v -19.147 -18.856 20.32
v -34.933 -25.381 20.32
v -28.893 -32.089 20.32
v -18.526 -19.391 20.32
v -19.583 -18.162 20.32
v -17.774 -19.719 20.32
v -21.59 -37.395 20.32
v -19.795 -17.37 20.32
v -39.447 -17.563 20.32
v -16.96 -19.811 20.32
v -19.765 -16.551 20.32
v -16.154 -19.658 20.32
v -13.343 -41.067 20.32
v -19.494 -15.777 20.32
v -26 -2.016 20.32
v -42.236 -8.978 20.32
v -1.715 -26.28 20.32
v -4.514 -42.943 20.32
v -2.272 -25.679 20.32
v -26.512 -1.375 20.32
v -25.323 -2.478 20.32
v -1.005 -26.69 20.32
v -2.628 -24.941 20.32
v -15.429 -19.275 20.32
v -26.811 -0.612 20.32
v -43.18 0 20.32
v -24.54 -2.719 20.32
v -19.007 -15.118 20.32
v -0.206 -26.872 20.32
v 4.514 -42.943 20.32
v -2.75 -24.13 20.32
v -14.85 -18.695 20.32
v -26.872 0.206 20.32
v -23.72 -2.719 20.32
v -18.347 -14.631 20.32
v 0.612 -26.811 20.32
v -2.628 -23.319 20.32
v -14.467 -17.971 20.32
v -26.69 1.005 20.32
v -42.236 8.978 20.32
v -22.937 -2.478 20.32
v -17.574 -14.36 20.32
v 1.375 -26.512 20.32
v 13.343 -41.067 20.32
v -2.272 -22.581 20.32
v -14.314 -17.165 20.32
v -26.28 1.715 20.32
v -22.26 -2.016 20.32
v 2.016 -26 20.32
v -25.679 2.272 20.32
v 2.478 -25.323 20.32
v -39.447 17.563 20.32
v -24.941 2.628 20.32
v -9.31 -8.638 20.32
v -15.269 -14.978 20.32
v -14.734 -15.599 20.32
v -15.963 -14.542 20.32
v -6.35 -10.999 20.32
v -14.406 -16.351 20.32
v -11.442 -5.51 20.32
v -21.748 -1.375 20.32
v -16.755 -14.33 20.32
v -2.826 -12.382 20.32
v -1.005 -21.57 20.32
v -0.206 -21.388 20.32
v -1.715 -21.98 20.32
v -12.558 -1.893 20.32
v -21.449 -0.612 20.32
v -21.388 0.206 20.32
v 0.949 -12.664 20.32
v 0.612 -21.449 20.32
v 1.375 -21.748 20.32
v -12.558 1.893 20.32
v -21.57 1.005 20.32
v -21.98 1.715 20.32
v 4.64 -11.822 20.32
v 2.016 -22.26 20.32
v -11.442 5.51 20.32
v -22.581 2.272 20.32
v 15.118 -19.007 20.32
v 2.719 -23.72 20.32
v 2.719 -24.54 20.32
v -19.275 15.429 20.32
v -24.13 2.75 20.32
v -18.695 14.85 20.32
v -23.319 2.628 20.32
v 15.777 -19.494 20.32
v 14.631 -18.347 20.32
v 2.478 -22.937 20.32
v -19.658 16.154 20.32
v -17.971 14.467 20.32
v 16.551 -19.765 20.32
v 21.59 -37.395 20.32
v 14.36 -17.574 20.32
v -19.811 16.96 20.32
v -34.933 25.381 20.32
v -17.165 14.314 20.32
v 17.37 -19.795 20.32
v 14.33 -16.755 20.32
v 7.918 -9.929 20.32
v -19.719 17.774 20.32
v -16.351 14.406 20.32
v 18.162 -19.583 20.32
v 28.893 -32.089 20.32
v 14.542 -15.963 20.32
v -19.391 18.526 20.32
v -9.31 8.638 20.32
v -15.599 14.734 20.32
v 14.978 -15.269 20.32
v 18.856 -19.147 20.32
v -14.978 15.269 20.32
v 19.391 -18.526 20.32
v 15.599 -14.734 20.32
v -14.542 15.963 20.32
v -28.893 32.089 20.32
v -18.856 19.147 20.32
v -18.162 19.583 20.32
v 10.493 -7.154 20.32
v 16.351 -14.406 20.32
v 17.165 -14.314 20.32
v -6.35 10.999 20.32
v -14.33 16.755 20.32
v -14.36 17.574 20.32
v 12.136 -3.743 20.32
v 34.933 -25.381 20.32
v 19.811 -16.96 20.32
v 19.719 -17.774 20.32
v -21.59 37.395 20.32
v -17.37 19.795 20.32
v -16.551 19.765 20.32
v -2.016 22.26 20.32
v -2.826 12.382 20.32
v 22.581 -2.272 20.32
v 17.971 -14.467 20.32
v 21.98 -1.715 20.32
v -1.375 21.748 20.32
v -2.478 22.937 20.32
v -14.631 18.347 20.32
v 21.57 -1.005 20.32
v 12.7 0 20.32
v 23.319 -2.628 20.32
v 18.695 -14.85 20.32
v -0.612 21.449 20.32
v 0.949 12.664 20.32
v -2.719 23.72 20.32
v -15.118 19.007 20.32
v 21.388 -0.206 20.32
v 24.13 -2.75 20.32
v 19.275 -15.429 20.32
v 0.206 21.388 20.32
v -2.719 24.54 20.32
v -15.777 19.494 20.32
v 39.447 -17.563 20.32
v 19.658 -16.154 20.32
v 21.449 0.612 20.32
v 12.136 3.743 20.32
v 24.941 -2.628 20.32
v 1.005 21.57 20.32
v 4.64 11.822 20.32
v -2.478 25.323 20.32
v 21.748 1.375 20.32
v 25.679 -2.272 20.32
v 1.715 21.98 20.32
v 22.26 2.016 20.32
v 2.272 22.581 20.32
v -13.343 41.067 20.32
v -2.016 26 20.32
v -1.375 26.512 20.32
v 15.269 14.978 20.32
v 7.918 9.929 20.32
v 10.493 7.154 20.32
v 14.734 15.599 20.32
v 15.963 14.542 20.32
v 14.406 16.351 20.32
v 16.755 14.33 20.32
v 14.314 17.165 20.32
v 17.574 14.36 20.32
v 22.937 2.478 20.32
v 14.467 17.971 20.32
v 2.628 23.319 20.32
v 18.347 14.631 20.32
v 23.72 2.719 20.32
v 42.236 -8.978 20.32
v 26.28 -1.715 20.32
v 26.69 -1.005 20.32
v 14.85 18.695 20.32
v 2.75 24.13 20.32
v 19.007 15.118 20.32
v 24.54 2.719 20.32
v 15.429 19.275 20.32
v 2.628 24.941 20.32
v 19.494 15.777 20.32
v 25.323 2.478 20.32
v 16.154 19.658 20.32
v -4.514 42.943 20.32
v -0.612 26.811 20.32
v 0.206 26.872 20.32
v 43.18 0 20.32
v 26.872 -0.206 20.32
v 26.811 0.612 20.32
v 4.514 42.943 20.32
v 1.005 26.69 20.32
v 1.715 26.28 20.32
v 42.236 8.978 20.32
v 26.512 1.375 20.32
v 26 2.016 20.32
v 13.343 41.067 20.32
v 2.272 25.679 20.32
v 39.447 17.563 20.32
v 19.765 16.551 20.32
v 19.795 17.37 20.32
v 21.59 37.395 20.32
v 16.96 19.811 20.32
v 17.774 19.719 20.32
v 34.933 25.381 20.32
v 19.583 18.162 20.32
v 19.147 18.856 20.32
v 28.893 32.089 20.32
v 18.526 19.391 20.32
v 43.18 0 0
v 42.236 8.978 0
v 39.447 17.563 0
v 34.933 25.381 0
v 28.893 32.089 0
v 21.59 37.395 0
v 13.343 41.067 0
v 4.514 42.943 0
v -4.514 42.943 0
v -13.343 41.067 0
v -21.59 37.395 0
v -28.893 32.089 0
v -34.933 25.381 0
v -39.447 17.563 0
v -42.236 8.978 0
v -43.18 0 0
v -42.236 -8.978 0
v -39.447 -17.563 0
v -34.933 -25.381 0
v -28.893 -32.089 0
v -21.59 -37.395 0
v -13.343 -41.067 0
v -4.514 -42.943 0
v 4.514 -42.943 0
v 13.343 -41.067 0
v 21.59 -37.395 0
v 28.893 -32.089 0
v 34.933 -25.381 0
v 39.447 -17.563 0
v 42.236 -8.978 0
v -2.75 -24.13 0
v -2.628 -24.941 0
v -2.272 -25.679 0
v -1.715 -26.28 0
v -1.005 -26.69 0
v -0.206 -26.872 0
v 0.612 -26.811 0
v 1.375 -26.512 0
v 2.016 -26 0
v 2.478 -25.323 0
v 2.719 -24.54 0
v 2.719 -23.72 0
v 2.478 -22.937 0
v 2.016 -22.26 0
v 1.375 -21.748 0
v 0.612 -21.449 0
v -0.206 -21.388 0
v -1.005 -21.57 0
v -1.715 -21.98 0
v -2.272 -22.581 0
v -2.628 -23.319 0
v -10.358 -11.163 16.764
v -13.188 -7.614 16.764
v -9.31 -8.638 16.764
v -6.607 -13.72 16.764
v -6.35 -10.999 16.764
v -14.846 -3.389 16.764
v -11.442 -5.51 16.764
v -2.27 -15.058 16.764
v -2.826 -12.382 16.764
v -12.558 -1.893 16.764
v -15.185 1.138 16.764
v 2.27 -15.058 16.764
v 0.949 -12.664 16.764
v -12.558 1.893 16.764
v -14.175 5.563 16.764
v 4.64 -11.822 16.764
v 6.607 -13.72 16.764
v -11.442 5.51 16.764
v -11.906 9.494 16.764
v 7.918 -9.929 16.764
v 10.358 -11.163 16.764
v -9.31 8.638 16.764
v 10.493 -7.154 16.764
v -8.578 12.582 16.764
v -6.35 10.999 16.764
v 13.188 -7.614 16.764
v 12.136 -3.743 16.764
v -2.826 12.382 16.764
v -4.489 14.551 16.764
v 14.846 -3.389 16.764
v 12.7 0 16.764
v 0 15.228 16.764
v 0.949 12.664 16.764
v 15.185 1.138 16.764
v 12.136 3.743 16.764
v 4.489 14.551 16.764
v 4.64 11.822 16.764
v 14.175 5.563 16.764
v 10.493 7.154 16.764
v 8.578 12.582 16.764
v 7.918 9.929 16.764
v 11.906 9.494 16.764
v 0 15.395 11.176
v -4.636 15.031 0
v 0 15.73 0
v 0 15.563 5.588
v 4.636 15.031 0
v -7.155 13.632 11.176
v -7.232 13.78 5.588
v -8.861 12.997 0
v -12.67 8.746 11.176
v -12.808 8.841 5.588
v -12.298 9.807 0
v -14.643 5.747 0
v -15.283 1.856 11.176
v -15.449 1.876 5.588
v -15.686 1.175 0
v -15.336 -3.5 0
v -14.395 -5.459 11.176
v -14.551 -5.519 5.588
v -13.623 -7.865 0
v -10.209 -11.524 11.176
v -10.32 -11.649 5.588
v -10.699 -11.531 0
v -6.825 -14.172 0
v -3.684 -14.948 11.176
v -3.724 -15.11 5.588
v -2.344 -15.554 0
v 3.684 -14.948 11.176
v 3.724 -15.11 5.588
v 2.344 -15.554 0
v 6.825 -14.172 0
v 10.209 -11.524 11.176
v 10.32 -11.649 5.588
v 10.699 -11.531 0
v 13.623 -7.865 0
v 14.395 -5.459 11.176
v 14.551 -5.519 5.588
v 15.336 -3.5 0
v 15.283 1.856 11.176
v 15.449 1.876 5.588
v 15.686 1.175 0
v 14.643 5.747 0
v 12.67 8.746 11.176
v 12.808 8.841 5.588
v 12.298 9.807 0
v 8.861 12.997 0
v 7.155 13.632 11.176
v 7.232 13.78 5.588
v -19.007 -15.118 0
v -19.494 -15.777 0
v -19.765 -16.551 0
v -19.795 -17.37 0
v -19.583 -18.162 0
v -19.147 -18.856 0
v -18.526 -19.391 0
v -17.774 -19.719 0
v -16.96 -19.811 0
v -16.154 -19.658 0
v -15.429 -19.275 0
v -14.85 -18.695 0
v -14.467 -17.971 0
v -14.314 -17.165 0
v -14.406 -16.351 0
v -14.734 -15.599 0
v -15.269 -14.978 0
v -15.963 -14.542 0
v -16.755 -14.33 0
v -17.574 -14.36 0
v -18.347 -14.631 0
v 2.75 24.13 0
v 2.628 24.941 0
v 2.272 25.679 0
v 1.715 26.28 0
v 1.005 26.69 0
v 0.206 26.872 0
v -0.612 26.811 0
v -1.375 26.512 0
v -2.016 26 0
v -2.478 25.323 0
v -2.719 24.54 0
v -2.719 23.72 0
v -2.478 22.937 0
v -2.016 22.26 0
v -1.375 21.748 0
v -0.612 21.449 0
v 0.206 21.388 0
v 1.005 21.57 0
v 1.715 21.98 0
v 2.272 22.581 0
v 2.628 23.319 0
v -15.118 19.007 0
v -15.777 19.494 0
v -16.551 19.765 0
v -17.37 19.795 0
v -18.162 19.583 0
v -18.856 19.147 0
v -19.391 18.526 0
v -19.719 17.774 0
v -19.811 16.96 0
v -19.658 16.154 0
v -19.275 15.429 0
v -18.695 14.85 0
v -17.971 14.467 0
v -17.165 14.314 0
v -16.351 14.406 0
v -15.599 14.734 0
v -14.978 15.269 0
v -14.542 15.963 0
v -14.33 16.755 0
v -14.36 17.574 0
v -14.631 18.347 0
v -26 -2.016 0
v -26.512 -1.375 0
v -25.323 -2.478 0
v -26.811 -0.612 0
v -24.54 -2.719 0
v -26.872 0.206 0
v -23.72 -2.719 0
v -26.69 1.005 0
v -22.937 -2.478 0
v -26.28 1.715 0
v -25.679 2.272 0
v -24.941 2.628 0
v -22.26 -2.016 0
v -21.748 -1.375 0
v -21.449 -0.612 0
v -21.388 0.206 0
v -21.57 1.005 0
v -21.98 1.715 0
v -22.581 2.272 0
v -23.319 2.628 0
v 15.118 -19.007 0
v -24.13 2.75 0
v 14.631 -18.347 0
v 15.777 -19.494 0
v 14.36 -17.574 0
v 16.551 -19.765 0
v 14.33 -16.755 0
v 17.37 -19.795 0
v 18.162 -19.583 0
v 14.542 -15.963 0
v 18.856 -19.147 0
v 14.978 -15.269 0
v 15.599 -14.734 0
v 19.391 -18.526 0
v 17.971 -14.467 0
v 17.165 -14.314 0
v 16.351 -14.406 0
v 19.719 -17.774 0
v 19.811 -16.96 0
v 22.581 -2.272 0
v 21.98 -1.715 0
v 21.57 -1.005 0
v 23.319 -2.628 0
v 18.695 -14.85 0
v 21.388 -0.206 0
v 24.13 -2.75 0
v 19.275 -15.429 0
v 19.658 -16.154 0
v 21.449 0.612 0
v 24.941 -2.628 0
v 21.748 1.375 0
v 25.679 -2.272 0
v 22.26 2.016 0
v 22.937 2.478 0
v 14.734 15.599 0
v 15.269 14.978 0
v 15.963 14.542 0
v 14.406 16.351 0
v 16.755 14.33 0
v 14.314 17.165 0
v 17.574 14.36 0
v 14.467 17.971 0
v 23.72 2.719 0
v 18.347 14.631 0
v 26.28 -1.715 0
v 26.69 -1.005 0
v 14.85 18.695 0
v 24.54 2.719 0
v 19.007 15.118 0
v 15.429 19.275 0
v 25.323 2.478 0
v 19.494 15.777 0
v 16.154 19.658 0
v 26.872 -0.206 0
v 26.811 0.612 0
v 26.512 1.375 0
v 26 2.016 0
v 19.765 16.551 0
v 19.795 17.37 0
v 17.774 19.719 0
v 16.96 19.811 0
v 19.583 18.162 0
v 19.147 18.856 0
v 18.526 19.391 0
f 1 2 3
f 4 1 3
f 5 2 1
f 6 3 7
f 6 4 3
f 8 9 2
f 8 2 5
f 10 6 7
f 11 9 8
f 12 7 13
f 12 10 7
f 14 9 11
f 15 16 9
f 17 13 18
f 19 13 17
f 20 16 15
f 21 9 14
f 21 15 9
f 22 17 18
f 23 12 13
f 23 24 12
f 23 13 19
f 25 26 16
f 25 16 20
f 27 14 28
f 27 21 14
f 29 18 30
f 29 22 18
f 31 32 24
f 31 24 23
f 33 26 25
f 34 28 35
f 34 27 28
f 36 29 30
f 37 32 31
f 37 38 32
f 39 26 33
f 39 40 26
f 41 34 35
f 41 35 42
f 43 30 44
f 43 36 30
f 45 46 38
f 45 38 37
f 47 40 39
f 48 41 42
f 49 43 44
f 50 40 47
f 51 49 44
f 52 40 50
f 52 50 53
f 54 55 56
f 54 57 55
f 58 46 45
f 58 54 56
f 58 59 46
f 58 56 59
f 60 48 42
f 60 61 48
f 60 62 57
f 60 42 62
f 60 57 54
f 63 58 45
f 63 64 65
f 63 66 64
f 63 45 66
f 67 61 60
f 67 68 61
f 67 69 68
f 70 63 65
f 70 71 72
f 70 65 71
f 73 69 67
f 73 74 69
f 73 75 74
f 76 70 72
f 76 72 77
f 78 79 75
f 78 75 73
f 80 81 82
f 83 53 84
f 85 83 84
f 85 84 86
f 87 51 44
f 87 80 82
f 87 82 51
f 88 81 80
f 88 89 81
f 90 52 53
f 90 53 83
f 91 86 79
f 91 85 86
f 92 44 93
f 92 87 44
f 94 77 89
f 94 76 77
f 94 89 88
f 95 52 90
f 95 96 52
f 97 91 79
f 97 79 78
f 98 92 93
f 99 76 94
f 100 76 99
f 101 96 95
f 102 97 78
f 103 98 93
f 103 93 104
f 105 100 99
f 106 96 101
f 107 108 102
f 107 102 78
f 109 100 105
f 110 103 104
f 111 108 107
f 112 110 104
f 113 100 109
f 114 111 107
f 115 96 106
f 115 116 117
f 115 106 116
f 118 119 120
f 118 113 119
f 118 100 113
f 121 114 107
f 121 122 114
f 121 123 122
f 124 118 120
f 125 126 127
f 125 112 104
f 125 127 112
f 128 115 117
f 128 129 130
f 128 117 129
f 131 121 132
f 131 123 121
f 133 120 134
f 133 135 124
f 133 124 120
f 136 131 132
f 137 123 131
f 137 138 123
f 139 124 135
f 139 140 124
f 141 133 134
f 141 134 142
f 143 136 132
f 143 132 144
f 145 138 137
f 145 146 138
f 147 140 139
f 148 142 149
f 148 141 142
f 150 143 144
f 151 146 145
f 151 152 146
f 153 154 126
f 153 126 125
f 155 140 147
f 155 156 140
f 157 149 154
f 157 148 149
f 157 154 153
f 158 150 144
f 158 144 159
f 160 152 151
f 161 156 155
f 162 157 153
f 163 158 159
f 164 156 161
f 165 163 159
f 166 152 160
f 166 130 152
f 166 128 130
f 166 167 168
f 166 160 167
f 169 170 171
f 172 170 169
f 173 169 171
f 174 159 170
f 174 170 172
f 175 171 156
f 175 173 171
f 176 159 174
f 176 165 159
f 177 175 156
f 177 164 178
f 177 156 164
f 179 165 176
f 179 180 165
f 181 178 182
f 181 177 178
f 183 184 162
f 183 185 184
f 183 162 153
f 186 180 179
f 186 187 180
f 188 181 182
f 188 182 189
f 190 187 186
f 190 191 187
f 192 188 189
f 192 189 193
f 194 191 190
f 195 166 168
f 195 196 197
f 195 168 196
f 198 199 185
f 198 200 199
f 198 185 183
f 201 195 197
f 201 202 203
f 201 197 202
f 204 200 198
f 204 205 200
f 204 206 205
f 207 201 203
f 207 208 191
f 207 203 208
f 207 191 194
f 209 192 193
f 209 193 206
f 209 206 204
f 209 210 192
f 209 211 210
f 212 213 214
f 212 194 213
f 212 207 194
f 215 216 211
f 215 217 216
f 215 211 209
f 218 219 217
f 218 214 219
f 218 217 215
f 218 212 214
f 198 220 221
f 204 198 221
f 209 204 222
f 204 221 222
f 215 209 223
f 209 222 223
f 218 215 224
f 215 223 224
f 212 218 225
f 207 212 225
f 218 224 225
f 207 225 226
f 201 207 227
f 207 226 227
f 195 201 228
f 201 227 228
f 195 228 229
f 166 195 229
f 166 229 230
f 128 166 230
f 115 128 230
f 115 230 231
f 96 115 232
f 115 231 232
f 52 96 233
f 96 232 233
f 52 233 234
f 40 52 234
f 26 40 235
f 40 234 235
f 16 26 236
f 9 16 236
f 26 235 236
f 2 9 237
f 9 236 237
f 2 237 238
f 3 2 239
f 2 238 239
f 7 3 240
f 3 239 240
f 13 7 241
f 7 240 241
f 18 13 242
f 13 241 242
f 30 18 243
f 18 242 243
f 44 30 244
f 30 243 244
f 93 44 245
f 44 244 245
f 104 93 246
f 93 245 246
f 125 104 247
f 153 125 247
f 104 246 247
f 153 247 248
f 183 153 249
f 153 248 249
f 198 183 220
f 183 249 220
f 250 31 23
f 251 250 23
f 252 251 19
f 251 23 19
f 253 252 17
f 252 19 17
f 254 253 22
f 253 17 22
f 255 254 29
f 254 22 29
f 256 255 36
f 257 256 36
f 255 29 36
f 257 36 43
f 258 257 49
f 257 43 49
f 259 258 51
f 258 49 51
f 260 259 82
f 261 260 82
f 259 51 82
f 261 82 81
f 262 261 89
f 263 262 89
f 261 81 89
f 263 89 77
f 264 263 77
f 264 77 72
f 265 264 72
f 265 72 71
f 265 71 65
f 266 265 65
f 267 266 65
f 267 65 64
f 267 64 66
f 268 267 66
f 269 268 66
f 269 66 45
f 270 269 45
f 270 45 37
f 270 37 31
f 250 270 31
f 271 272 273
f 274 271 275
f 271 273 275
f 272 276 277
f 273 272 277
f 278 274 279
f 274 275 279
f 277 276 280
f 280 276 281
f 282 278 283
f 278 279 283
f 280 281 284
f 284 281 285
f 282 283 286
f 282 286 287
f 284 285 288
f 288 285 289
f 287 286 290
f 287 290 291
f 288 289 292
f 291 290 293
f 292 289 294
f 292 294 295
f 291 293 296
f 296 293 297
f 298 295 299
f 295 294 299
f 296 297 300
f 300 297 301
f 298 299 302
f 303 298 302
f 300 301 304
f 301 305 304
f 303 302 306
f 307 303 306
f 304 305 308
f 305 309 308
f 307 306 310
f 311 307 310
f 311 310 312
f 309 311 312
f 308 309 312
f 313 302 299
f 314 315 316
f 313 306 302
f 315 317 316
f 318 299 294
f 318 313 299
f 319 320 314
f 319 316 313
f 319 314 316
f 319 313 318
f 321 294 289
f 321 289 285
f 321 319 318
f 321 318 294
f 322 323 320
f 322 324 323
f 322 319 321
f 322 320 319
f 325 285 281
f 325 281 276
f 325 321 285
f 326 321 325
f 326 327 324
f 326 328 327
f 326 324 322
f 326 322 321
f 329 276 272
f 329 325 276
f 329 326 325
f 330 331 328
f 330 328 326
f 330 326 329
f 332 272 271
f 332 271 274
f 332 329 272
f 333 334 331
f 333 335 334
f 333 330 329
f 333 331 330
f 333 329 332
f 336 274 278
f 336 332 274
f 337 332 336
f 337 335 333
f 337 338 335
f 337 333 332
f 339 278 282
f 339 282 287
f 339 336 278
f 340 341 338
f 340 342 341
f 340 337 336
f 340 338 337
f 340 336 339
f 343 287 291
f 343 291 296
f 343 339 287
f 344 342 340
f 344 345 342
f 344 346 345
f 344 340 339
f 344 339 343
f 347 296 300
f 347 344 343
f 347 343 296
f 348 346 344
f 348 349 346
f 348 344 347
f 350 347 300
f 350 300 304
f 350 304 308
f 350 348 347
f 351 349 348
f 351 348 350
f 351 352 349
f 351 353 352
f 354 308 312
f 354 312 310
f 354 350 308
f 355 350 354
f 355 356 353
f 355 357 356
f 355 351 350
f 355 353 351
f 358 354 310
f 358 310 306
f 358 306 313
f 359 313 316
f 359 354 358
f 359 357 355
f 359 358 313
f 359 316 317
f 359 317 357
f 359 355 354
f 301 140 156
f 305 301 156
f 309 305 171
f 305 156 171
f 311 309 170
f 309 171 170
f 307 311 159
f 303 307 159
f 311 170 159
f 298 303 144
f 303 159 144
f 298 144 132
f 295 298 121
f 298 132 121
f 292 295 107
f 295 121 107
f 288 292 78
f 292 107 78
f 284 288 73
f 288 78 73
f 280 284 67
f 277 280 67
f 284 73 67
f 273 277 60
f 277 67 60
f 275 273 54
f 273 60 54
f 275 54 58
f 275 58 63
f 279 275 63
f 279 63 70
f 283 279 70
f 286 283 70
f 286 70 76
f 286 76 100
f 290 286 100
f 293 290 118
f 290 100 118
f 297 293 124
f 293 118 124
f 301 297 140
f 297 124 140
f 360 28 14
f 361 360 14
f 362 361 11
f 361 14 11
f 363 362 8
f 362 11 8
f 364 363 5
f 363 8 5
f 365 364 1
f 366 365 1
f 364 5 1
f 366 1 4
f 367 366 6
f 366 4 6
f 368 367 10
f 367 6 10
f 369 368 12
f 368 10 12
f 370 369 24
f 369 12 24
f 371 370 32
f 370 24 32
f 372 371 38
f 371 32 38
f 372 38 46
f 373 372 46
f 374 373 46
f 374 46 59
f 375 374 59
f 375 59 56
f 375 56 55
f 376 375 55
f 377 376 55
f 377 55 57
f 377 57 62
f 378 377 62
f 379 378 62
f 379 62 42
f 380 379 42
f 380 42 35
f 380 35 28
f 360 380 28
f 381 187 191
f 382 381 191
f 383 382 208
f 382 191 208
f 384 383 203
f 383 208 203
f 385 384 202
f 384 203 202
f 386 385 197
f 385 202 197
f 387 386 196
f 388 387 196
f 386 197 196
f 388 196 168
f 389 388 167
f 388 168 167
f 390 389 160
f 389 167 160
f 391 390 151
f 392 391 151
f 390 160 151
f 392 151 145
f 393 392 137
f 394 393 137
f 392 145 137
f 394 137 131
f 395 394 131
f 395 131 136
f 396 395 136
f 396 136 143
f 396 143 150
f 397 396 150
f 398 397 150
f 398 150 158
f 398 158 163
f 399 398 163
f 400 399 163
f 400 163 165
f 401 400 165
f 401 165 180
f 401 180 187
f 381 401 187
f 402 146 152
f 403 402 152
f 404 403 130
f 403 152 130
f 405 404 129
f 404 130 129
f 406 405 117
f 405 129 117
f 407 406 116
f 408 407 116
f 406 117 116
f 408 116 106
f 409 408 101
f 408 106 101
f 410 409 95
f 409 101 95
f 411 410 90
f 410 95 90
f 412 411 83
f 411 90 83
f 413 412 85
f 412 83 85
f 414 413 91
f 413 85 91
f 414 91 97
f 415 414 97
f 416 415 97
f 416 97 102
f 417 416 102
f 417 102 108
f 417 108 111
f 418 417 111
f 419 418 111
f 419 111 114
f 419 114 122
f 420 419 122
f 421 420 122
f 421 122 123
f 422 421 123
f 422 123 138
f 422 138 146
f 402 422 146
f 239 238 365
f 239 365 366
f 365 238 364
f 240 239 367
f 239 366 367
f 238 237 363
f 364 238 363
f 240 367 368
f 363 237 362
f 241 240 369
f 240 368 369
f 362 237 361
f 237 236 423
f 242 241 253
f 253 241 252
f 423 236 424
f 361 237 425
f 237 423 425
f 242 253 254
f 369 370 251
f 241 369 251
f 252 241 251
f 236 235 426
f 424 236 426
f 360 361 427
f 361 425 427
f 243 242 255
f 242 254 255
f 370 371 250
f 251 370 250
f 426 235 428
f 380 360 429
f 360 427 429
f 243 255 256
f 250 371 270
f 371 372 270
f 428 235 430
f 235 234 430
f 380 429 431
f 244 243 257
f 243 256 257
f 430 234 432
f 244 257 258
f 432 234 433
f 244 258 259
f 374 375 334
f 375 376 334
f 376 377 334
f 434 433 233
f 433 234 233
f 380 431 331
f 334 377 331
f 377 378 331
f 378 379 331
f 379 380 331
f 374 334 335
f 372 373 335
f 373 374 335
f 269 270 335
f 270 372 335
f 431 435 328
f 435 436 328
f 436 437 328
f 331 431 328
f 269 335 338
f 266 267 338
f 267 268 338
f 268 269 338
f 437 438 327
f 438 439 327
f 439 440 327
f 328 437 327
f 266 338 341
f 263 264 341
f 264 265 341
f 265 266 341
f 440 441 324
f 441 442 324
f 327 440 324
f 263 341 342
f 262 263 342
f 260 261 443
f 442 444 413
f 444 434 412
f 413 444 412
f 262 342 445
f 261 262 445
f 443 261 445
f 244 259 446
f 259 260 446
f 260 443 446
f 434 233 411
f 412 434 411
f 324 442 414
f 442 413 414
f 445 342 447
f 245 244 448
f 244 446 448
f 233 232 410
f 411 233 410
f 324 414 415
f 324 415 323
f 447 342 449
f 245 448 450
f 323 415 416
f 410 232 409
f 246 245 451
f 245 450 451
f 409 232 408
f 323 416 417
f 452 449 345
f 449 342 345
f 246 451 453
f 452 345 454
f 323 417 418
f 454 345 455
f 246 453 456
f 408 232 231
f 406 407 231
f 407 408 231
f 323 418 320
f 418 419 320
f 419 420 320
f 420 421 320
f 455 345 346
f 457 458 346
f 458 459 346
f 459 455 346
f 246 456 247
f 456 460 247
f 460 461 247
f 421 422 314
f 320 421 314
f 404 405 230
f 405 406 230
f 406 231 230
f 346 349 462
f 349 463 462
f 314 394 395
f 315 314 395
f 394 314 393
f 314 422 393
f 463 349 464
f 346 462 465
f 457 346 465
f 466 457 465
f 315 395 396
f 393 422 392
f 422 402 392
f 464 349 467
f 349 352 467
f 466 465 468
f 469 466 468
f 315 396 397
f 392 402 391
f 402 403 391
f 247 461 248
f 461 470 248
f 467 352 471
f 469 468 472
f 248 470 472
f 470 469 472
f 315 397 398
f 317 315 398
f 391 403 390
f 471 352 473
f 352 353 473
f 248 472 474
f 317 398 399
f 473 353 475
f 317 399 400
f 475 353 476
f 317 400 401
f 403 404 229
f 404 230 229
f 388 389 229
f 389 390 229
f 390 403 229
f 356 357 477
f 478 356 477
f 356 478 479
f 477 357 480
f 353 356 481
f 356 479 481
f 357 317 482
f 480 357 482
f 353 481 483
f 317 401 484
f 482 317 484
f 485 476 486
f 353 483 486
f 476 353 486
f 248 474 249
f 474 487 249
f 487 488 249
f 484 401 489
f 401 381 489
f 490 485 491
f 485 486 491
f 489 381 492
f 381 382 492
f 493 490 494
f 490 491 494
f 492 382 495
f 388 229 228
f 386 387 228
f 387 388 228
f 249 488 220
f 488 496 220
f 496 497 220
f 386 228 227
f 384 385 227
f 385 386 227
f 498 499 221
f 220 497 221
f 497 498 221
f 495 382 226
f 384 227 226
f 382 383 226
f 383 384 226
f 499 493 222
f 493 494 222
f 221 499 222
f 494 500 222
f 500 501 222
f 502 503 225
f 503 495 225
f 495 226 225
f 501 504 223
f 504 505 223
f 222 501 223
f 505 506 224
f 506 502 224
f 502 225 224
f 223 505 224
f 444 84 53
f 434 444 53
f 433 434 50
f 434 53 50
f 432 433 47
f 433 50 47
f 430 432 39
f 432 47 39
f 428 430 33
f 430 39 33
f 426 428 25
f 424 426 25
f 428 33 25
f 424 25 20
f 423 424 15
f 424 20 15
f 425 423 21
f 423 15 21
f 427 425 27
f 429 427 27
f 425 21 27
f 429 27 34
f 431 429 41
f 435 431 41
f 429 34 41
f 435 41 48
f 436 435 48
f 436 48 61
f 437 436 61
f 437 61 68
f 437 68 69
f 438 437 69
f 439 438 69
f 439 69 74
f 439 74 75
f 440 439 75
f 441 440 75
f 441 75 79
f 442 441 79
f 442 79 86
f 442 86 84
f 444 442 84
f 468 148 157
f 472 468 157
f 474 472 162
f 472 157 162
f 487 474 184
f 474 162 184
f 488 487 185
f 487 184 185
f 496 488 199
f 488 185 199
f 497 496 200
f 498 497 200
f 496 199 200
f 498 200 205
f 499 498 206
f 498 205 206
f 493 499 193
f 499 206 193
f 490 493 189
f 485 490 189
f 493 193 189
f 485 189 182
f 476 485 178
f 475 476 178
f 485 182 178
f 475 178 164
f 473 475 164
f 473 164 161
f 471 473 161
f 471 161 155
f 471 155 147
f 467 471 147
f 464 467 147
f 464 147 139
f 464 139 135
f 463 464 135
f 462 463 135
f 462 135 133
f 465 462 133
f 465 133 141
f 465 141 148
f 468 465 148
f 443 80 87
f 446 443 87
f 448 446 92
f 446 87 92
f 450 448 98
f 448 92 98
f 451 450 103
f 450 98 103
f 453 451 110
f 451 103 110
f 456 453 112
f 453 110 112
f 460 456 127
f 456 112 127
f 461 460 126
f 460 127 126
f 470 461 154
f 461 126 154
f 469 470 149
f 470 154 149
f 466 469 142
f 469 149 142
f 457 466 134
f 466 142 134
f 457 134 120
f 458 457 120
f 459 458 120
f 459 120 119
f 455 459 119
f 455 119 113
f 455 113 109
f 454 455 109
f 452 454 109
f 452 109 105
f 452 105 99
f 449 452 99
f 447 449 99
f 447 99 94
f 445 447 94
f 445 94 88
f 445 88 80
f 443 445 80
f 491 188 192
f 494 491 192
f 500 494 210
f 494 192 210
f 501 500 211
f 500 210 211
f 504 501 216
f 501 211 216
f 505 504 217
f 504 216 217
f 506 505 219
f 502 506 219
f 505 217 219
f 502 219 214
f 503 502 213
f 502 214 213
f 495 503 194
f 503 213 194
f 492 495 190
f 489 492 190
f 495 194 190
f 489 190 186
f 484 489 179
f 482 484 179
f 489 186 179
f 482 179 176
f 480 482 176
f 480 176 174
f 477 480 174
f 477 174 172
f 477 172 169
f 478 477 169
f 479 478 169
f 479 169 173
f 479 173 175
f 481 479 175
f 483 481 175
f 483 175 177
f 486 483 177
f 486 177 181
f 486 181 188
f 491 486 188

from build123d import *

# Parameters (mm, degrees)
SKETCH1_R                = 43.18
BOSS_EXTRUDE1_DEPTH      = 20.32
M5_CLEARANCE_HOLE1_D     = 5.5
M5_CLEARANCE_HOLE1_DEPTH = 20.32
CIRPATTERN1_COUNT        = 8
SKETCH9_R                = 14.4907
SKETCH9_R_2              = 12.7
BOSS_EXTRUDE2_DEPTH      = 3.556


with BuildPart() as part:
    # Sketch1 → Boss-Extrude1 (new body)
    with BuildSketch(Plane.XY):
        Circle(SKETCH1_R)
    extrude(amount=BOSS_EXTRUDE1_DEPTH)

    # Sketch7 → 1 NPT Tapped Hole2 (revolve, cut)
    with BuildSketch(Plane.YZ):
        Polygon((0, 0), (0, 20.32), (14.4907, 20.32), (14.4907, 16.764), (15.22797859, 16.764), (15.7299152, 0), align=None)
    revolve(axis=Axis((0, 0, -6.35), (0, 0, 1)), mode=Mode.SUBTRACT)

    # M5 Clearance Hole1
    with Locations(Plane(origin=(0, 0, 0), x_dir=(-1, 0, 0), z_dir=(0, 0, -1))):
        with Locations((0, 24.13)):
            m5_clearance_hole1 = Hole(M5_CLEARANCE_HOLE1_D / 2, depth=M5_CLEARANCE_HOLE1_DEPTH)

    # CirPattern1: M5 Clearance Hole1 ×8 about axis
    cirpattern1_axis = Axis((0, 0, 0), (0, 0, 1))
    for i in range(1, CIRPATTERN1_COUNT):
        add(m5_clearance_hole1.rotate(cirpattern1_axis, i * 360 / CIRPATTERN1_COUNT), mode=Mode.SUBTRACT)

    # Sketch9 → Boss-Extrude2 (add)
    with BuildSketch(Plane.XY.offset(20.32)):
        Circle(SKETCH9_R)
        Circle(SKETCH9_R_2, mode=Mode.SUBTRACT)
    extrude(amount=-BOSS_EXTRUDE2_DEPTH)


solid = part.part
